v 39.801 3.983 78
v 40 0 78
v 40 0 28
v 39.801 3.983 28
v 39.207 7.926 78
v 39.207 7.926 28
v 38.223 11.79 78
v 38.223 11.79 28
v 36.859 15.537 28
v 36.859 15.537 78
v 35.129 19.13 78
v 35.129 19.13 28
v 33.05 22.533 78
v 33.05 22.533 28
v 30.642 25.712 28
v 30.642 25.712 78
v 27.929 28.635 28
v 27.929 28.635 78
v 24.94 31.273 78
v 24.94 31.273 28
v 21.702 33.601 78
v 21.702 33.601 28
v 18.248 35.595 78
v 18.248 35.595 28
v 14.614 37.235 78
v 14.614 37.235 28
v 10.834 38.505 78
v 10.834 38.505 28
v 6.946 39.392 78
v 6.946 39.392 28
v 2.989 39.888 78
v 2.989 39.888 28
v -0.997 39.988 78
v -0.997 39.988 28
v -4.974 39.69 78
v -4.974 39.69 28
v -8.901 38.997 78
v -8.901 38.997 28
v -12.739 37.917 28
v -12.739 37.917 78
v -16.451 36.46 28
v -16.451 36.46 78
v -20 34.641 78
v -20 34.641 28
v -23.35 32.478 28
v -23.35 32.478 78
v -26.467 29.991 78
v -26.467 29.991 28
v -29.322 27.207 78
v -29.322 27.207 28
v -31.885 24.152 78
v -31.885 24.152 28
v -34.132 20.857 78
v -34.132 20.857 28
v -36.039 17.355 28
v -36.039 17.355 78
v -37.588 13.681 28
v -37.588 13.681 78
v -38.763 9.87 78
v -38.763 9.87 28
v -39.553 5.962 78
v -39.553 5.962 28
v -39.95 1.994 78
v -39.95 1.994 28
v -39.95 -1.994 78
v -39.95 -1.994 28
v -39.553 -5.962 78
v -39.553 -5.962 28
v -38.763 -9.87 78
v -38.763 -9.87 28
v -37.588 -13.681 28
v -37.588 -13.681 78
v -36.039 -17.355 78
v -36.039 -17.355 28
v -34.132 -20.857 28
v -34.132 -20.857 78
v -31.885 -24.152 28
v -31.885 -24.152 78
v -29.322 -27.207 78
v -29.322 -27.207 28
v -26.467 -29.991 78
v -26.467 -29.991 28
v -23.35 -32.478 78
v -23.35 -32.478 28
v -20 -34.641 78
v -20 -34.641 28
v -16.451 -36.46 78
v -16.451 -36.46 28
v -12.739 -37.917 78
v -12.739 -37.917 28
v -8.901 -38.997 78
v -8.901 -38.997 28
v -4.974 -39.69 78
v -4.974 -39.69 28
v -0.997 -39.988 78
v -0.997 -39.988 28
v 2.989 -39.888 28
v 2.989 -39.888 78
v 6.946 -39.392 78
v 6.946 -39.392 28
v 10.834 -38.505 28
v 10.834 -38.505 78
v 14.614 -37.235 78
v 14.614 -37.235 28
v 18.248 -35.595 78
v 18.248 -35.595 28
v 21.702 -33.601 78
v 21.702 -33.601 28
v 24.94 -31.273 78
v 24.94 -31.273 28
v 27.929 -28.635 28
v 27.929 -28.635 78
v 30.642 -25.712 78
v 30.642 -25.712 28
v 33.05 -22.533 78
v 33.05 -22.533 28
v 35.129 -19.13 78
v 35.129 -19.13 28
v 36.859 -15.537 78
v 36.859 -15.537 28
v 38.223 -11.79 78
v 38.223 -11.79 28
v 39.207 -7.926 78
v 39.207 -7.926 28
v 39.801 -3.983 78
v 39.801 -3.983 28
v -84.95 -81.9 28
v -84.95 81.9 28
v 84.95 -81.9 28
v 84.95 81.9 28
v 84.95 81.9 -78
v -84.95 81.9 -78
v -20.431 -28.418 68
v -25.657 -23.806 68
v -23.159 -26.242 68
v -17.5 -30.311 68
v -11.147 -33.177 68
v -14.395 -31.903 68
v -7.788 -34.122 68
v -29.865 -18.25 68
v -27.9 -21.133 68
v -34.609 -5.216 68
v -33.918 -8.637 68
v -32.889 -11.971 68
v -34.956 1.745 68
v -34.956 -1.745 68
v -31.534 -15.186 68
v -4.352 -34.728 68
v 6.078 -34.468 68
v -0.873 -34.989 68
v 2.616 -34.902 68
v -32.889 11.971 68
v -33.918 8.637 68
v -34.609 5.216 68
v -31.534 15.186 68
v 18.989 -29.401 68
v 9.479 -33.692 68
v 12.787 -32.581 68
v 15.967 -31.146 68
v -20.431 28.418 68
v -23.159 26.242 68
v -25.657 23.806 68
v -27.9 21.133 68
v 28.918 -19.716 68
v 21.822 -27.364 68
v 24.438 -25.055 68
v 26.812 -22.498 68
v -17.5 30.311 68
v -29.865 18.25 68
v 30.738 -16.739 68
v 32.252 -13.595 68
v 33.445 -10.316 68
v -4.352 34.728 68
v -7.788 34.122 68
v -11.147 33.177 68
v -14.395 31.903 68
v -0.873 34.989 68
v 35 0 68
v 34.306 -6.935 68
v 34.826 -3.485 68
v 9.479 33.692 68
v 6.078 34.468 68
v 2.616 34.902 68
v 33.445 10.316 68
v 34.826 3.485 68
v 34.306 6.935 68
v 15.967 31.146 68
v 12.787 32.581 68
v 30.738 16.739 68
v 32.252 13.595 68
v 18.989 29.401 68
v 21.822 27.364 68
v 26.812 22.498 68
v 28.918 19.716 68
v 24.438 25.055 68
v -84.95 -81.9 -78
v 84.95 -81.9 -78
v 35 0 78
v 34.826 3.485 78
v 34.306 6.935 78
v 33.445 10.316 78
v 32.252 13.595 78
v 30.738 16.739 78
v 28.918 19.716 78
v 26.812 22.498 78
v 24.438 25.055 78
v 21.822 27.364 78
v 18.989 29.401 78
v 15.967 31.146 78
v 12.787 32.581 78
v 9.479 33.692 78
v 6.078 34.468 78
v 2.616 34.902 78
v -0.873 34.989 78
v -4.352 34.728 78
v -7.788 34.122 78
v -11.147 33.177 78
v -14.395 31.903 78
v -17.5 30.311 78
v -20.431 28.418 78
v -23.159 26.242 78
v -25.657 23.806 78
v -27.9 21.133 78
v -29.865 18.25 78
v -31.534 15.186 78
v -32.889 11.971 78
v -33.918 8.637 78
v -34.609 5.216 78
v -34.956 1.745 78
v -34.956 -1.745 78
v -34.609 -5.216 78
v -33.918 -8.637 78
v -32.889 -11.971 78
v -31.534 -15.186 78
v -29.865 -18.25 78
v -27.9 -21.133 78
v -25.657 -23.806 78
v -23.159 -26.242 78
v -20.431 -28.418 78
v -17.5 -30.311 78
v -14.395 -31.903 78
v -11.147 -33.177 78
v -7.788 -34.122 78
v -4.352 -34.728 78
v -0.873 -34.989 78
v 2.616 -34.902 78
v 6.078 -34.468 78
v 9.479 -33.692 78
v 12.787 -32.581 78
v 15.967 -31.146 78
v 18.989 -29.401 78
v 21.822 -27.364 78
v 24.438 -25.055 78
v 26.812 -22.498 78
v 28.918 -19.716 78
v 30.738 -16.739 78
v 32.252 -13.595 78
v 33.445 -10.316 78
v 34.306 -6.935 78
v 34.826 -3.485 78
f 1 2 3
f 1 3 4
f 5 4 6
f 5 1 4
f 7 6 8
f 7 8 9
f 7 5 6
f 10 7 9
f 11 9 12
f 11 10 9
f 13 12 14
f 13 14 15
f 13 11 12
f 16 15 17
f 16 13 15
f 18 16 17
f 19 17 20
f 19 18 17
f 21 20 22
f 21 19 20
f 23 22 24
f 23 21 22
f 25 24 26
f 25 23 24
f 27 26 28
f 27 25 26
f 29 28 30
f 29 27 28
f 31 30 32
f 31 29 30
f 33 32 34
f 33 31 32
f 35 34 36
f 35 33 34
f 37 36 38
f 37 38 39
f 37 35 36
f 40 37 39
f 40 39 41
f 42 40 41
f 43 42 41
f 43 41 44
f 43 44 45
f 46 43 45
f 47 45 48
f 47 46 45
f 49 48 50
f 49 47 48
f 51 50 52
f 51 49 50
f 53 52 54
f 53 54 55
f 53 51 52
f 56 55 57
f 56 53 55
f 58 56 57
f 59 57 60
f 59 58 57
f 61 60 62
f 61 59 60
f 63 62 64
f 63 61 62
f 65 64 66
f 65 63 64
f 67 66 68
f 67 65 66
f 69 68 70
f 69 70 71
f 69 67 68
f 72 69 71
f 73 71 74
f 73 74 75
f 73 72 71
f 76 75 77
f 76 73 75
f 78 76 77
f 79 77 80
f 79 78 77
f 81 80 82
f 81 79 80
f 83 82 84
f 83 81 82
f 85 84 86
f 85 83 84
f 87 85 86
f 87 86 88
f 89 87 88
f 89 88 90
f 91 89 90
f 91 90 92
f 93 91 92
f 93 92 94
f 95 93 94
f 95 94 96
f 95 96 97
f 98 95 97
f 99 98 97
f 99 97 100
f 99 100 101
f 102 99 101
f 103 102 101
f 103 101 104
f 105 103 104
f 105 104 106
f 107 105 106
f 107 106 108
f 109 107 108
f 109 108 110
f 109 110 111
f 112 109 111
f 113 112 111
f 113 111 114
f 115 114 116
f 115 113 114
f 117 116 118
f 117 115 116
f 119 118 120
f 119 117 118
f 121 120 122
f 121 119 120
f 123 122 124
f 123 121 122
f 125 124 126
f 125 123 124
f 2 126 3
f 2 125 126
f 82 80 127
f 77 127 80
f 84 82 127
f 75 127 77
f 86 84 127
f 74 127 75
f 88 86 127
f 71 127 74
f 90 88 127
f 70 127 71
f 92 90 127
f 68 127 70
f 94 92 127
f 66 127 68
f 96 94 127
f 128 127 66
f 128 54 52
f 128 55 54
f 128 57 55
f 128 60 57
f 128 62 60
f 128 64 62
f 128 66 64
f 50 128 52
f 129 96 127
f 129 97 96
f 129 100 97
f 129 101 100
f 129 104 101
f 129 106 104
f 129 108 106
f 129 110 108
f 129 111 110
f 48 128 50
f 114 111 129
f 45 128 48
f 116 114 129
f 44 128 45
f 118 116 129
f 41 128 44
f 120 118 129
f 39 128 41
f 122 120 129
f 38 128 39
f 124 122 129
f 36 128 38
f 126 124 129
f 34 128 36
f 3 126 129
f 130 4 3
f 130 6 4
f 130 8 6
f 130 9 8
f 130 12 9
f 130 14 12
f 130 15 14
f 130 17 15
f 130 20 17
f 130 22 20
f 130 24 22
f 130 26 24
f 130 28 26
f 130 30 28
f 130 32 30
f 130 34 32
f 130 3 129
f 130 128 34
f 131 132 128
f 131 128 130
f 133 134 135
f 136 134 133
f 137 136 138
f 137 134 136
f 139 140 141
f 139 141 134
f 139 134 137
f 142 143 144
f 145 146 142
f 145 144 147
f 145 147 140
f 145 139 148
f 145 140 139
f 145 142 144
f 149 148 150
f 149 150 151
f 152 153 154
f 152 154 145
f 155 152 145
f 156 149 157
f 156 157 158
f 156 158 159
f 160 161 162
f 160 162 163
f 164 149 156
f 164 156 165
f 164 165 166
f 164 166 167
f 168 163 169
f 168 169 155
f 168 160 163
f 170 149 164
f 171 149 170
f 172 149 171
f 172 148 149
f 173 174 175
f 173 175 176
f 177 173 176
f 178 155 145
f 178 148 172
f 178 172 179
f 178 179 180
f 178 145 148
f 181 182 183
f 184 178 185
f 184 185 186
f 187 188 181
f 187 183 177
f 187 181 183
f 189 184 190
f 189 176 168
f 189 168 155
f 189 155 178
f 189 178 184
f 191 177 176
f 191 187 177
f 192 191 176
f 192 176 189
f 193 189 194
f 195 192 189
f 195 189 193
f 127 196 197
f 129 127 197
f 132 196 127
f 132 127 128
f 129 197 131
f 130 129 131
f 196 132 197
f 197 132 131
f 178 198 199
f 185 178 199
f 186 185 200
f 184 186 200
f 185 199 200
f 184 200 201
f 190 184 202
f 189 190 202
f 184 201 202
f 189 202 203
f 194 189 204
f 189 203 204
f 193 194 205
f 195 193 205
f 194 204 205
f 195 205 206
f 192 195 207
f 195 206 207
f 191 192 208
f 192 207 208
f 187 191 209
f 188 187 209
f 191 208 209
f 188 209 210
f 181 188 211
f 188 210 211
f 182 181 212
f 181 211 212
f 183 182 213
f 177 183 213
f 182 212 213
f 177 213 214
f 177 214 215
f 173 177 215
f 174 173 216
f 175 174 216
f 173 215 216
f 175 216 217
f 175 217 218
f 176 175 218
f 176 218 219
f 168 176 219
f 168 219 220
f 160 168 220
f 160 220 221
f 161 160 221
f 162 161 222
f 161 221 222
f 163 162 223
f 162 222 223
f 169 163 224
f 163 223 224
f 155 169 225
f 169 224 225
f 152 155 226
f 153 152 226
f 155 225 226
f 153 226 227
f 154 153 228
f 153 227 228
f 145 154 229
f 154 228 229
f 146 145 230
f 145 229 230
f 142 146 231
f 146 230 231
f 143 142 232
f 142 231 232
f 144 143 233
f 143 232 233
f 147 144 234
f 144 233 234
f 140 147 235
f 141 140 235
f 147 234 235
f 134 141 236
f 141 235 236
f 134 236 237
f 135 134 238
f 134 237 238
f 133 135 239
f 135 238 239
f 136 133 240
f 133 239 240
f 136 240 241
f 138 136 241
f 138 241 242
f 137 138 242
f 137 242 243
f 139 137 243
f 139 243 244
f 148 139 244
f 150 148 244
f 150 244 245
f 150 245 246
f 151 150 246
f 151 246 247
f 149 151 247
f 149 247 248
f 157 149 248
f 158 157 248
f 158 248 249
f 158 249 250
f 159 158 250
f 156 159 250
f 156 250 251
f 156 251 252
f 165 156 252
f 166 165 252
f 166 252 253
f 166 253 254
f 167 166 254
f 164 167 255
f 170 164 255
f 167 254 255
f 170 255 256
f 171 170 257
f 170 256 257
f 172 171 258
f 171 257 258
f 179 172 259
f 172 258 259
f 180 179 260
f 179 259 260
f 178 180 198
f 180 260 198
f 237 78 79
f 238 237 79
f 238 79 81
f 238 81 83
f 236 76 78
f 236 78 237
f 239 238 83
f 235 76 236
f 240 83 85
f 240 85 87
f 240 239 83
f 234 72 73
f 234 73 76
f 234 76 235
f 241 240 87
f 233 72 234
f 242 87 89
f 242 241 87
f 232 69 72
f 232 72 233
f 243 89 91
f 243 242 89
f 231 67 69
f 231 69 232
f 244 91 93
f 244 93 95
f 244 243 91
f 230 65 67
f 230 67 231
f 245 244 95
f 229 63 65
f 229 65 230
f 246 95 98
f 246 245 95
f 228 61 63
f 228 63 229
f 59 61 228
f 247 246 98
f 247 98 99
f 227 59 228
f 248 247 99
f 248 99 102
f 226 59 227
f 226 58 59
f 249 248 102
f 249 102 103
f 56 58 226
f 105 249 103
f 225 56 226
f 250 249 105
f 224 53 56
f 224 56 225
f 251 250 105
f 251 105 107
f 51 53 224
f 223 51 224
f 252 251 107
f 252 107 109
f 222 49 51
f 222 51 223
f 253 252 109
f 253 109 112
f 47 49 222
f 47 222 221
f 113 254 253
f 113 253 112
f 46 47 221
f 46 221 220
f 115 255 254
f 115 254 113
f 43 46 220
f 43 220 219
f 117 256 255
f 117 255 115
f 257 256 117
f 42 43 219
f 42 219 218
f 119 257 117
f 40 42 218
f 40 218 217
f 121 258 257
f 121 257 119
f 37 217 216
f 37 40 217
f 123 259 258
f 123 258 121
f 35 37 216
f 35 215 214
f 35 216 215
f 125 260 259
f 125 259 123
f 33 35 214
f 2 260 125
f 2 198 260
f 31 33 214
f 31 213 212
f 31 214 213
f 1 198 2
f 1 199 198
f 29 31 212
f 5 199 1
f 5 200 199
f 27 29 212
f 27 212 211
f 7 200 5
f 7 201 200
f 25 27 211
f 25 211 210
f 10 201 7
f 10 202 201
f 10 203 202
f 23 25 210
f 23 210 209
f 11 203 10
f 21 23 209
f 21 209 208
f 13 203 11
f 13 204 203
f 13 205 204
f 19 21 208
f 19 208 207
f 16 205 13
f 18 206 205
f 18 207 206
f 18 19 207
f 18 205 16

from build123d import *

# Parameters (mm, degrees)
ESTRUSIONE_ESTRUSIONE1_DEPTH      = 78
ESTRUSIONE_ESTRUSIONE1_DEPTH_BACK = 78
SCHIZZO1_W                        = 169.9
SCHIZZO1_H                        = 163.8
SCHIZZO2_W                        = 169.9
SCHIZZO2_H                        = 163.8
SCHIZZO2_R                        = 40
TAGLIO_ESTRUSIONE1_DEPTH          = 50
SCHIZZO3_R                        = 35
TAGLIO_ESTRUSIONE2_DEPTH          = 10


with BuildPart() as part:
    # Schizzo1 → Estrusione-Estrusione1 (new, two sides: drawn at the far end of the back side and taken through both)
    with BuildSketch(Plane.XY.offset(-ESTRUSIONE_ESTRUSIONE1_DEPTH_BACK)):
        Rectangle(SCHIZZO1_W, SCHIZZO1_H)
    extrude(amount=ESTRUSIONE_ESTRUSIONE1_DEPTH + ESTRUSIONE_ESTRUSIONE1_DEPTH_BACK)

    # Schizzo2 → Taglio-Estrusione1 (cut)
    with BuildSketch(Plane.XY.offset(78)):
        Rectangle(SCHIZZO2_W, SCHIZZO2_H)
        Circle(SCHIZZO2_R, mode=Mode.SUBTRACT)
    extrude(amount=-TAGLIO_ESTRUSIONE1_DEPTH, mode=Mode.SUBTRACT)

    # Schizzo3 → Taglio-Estrusione2 (cut)
    with BuildSketch(Plane.XY.offset(78)):
        Circle(SCHIZZO3_R)
    extrude(amount=-TAGLIO_ESTRUSIONE2_DEPTH, mode=Mode.SUBTRACT)


solid = part.part
